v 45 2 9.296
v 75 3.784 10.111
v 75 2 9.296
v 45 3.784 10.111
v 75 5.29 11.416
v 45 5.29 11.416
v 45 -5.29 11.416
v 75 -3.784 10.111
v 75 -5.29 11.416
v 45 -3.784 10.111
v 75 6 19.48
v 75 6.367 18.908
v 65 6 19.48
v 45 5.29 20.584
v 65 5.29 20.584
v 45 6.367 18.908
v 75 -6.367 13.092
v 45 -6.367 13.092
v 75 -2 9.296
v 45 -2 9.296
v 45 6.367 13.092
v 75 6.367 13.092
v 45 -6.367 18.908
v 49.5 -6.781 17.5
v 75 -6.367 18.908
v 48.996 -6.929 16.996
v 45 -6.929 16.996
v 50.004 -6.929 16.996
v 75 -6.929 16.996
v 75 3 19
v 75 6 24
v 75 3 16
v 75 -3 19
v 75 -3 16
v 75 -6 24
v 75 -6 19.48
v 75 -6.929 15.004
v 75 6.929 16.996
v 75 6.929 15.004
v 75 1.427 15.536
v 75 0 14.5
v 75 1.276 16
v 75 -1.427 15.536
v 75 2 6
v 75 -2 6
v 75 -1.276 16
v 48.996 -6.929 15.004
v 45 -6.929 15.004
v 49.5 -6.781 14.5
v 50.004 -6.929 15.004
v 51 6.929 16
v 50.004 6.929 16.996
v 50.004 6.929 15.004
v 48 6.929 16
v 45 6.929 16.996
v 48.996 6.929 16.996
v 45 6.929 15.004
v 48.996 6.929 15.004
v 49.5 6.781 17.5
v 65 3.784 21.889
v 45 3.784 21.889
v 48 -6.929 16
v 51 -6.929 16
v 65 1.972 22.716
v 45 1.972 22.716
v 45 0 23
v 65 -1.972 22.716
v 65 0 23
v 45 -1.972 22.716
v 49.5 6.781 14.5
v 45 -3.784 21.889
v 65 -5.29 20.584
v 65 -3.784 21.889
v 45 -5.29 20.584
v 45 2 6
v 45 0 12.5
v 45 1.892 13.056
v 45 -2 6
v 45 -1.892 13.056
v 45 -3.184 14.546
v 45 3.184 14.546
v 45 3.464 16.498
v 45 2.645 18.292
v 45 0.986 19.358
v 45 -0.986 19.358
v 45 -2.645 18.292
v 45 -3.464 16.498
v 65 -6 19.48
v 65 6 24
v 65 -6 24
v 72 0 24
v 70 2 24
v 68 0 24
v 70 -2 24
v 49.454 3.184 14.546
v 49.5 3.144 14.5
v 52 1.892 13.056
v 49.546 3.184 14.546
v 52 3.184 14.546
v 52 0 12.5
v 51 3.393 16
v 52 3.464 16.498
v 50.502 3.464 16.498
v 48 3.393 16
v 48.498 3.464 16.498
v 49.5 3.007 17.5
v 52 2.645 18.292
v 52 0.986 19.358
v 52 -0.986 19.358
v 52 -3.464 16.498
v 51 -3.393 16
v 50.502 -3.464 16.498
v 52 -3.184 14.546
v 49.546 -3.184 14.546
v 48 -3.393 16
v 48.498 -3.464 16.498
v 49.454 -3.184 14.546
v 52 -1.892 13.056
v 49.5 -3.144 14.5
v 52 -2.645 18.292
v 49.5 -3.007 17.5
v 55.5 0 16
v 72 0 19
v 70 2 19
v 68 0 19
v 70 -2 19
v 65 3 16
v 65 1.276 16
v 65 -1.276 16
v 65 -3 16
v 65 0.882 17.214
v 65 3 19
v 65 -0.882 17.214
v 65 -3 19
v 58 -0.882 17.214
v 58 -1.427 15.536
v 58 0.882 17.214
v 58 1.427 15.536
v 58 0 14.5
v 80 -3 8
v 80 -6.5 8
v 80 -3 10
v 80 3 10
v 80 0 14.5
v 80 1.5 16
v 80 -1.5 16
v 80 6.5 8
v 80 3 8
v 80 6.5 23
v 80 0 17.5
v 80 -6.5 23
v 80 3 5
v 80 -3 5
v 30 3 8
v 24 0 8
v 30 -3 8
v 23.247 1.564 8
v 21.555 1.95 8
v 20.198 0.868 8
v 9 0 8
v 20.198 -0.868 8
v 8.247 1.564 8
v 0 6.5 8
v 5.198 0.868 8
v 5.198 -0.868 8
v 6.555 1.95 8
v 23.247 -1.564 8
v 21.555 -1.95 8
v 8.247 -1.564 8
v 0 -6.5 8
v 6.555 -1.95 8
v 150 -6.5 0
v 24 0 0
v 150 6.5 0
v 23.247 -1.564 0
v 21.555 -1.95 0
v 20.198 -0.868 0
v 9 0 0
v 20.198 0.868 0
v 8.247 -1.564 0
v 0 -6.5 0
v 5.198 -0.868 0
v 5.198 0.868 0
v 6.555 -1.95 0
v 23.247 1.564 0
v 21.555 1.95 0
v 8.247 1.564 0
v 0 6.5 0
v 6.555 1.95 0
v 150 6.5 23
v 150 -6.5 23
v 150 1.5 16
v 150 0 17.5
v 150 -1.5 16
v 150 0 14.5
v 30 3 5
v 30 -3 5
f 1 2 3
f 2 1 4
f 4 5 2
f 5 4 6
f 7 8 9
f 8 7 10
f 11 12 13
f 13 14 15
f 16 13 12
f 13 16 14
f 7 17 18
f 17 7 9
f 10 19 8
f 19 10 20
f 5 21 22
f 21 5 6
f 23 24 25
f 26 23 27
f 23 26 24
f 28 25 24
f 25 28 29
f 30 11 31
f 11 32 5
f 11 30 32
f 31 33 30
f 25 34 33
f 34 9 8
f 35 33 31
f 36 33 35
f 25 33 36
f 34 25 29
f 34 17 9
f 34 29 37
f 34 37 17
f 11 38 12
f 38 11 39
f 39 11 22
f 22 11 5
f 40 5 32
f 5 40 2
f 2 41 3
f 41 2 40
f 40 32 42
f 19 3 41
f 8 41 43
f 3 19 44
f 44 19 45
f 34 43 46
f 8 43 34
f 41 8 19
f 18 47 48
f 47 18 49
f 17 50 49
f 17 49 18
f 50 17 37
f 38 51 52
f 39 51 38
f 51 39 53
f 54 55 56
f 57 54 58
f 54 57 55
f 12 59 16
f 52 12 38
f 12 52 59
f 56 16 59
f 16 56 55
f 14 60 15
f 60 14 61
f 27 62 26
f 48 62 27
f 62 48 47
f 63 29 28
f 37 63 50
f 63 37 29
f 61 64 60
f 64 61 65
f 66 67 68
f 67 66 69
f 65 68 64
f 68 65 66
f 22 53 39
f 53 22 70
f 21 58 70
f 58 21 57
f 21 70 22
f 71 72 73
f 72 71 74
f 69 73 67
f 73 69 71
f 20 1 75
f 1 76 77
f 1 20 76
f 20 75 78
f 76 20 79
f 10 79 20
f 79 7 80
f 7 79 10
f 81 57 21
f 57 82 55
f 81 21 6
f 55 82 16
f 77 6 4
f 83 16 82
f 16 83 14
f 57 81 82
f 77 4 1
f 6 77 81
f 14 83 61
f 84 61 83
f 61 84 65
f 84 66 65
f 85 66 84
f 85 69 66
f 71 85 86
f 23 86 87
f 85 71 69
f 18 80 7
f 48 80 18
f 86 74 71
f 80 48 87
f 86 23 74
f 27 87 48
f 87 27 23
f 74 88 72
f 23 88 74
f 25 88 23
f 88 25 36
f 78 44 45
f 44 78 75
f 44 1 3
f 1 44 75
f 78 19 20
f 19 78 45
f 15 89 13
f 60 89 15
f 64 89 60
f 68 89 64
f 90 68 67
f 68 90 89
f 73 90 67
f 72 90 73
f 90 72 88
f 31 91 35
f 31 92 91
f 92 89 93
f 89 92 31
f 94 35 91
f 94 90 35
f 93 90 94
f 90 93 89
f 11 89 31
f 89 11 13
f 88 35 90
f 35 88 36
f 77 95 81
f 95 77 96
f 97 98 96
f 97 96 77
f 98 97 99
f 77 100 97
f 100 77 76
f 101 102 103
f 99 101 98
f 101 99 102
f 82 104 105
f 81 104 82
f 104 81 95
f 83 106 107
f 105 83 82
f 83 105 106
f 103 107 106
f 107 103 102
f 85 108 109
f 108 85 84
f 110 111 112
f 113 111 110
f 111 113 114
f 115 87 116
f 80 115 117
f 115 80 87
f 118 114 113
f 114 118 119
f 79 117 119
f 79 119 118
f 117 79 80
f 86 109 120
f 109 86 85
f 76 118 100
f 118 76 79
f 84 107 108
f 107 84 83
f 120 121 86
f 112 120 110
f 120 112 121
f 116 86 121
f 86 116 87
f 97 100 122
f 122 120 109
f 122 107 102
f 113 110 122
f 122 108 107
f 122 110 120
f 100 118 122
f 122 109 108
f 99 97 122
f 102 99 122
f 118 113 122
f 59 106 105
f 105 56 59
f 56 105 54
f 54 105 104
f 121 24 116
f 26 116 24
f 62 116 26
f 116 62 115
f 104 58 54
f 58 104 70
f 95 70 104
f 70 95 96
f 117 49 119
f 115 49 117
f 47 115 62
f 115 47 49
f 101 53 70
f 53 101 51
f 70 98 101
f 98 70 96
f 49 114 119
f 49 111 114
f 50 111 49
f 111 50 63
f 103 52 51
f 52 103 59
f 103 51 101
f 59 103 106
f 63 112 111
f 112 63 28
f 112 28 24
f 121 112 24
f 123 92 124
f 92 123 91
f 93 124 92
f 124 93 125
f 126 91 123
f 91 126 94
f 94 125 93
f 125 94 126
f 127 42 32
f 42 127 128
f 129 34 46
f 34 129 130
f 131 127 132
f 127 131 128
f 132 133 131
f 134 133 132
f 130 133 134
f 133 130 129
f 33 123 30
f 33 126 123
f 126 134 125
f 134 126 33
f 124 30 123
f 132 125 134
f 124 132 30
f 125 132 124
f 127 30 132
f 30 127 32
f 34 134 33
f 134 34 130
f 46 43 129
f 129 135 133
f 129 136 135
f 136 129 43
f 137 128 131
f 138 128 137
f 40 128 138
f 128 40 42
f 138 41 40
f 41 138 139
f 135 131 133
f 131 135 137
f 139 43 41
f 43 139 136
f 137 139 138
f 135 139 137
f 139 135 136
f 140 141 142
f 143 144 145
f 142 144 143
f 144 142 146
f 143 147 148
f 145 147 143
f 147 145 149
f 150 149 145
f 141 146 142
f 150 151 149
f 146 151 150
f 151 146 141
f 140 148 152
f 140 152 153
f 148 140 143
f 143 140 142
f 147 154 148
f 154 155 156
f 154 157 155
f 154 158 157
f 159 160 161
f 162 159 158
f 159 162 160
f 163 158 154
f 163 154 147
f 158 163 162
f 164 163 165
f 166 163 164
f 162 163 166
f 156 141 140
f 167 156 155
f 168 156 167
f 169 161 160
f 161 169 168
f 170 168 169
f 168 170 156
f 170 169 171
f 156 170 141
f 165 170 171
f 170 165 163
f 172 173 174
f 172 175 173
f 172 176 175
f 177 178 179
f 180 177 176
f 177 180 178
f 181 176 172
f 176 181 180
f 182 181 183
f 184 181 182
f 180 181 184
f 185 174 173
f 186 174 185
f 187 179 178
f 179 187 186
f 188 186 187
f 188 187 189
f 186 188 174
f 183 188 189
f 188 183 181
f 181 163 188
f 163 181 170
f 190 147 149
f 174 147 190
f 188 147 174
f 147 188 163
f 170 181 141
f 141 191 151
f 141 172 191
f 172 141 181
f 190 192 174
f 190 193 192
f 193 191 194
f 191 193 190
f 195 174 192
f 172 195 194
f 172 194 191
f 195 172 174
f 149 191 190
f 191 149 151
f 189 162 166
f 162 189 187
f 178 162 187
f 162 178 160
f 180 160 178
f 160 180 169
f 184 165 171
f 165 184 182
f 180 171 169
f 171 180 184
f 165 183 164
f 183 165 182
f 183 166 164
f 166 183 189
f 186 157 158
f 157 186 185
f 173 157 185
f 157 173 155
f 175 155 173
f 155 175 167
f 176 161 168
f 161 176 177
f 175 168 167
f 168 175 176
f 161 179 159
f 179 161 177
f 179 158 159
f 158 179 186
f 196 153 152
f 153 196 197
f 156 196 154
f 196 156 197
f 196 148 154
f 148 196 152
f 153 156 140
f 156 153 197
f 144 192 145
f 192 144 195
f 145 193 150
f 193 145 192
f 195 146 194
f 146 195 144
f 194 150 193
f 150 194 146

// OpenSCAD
module Solenoid(shaftDiameter=6+1, shaftLength=8.1,
                   pinDiameter=2+1, pinOffset=2.5, pinLengthExtra=20) {
  
  // Solenoid shaft
  render()
  difference() {
    union() {
      cylinder(r=shaftDiameter/2, h=shaftLength);
    
      mirror([0,0,1])
      cylinder(r1=shaftDiameter/2, r2=0, h=shaftDiameter/2);
    }
    
  }
  
  // Pin
  translate([0,0,pinOffset])
  rotate([90,0,0])
  cylinder(r=pinDiameter/2,
           h=shaftDiameter+pinLengthExtra+2,
      center=true,
         $fn=4);
}

module SolenoidHead(probeDiameter=3) {
  
  render()
  difference() {
    
    // Body
    union() {
      
      // Body
      cylinder(r=7, h=30);
      
      // Alignment Lug
      translate([0,-2,0])
      cube([10,4,30]);
      
      // Electrode Bolt Support
      translate([-8,-6,20])
      cube([10,12,10]);
    }
    
    translate([0,0,7])
    mirror([0,0,1])
    Solenoid();
    
    // Electrode Bolt
    translate([0,0,25])
    rotate([0,-90,0])
    cylinder(r=2, h=10, $fn=4);
    
    // Electrode Nut
    translate([-3,-3,20])
    #cube([3,6,11]);
    
    
    // Probe
    translate([0,0,13])
    cylinder(r=probeDiameter/2, h=30);
  }
}

module SolenoidMount(frameWidth=13, frameLength=30,
                     boltSpacing=15, boltOffset=7,
                     guideLength=70) {

  difference() {
    union() {
      translate([0,-frameWidth/2,0])
      cube([frameLength+50, frameWidth, 8]);
      
      translate([frameLength+50,-frameWidth/2,0])
      cube([guideLength, frameWidth, 23]);
    }
    
    // Head guide slot      
    translate([frameLength,-3,5])
    cube([50, 6, 5]);
    
    // Probe guide hole
    translate([frameLength+49,0,16])
    rotate([0,90,0])
    cylinder(r=1.5, h=guideLength+2, $fn=4);
    
    for (X = [0,boltSpacing])
    translate([boltOffset+X,0,-1])
    cylinder(r=2, h=11);
  }
}

translate([45,0,16])
rotate([0,90,0])
//!mirror([0,0,1])
SolenoidHead();

SolenoidMount();
